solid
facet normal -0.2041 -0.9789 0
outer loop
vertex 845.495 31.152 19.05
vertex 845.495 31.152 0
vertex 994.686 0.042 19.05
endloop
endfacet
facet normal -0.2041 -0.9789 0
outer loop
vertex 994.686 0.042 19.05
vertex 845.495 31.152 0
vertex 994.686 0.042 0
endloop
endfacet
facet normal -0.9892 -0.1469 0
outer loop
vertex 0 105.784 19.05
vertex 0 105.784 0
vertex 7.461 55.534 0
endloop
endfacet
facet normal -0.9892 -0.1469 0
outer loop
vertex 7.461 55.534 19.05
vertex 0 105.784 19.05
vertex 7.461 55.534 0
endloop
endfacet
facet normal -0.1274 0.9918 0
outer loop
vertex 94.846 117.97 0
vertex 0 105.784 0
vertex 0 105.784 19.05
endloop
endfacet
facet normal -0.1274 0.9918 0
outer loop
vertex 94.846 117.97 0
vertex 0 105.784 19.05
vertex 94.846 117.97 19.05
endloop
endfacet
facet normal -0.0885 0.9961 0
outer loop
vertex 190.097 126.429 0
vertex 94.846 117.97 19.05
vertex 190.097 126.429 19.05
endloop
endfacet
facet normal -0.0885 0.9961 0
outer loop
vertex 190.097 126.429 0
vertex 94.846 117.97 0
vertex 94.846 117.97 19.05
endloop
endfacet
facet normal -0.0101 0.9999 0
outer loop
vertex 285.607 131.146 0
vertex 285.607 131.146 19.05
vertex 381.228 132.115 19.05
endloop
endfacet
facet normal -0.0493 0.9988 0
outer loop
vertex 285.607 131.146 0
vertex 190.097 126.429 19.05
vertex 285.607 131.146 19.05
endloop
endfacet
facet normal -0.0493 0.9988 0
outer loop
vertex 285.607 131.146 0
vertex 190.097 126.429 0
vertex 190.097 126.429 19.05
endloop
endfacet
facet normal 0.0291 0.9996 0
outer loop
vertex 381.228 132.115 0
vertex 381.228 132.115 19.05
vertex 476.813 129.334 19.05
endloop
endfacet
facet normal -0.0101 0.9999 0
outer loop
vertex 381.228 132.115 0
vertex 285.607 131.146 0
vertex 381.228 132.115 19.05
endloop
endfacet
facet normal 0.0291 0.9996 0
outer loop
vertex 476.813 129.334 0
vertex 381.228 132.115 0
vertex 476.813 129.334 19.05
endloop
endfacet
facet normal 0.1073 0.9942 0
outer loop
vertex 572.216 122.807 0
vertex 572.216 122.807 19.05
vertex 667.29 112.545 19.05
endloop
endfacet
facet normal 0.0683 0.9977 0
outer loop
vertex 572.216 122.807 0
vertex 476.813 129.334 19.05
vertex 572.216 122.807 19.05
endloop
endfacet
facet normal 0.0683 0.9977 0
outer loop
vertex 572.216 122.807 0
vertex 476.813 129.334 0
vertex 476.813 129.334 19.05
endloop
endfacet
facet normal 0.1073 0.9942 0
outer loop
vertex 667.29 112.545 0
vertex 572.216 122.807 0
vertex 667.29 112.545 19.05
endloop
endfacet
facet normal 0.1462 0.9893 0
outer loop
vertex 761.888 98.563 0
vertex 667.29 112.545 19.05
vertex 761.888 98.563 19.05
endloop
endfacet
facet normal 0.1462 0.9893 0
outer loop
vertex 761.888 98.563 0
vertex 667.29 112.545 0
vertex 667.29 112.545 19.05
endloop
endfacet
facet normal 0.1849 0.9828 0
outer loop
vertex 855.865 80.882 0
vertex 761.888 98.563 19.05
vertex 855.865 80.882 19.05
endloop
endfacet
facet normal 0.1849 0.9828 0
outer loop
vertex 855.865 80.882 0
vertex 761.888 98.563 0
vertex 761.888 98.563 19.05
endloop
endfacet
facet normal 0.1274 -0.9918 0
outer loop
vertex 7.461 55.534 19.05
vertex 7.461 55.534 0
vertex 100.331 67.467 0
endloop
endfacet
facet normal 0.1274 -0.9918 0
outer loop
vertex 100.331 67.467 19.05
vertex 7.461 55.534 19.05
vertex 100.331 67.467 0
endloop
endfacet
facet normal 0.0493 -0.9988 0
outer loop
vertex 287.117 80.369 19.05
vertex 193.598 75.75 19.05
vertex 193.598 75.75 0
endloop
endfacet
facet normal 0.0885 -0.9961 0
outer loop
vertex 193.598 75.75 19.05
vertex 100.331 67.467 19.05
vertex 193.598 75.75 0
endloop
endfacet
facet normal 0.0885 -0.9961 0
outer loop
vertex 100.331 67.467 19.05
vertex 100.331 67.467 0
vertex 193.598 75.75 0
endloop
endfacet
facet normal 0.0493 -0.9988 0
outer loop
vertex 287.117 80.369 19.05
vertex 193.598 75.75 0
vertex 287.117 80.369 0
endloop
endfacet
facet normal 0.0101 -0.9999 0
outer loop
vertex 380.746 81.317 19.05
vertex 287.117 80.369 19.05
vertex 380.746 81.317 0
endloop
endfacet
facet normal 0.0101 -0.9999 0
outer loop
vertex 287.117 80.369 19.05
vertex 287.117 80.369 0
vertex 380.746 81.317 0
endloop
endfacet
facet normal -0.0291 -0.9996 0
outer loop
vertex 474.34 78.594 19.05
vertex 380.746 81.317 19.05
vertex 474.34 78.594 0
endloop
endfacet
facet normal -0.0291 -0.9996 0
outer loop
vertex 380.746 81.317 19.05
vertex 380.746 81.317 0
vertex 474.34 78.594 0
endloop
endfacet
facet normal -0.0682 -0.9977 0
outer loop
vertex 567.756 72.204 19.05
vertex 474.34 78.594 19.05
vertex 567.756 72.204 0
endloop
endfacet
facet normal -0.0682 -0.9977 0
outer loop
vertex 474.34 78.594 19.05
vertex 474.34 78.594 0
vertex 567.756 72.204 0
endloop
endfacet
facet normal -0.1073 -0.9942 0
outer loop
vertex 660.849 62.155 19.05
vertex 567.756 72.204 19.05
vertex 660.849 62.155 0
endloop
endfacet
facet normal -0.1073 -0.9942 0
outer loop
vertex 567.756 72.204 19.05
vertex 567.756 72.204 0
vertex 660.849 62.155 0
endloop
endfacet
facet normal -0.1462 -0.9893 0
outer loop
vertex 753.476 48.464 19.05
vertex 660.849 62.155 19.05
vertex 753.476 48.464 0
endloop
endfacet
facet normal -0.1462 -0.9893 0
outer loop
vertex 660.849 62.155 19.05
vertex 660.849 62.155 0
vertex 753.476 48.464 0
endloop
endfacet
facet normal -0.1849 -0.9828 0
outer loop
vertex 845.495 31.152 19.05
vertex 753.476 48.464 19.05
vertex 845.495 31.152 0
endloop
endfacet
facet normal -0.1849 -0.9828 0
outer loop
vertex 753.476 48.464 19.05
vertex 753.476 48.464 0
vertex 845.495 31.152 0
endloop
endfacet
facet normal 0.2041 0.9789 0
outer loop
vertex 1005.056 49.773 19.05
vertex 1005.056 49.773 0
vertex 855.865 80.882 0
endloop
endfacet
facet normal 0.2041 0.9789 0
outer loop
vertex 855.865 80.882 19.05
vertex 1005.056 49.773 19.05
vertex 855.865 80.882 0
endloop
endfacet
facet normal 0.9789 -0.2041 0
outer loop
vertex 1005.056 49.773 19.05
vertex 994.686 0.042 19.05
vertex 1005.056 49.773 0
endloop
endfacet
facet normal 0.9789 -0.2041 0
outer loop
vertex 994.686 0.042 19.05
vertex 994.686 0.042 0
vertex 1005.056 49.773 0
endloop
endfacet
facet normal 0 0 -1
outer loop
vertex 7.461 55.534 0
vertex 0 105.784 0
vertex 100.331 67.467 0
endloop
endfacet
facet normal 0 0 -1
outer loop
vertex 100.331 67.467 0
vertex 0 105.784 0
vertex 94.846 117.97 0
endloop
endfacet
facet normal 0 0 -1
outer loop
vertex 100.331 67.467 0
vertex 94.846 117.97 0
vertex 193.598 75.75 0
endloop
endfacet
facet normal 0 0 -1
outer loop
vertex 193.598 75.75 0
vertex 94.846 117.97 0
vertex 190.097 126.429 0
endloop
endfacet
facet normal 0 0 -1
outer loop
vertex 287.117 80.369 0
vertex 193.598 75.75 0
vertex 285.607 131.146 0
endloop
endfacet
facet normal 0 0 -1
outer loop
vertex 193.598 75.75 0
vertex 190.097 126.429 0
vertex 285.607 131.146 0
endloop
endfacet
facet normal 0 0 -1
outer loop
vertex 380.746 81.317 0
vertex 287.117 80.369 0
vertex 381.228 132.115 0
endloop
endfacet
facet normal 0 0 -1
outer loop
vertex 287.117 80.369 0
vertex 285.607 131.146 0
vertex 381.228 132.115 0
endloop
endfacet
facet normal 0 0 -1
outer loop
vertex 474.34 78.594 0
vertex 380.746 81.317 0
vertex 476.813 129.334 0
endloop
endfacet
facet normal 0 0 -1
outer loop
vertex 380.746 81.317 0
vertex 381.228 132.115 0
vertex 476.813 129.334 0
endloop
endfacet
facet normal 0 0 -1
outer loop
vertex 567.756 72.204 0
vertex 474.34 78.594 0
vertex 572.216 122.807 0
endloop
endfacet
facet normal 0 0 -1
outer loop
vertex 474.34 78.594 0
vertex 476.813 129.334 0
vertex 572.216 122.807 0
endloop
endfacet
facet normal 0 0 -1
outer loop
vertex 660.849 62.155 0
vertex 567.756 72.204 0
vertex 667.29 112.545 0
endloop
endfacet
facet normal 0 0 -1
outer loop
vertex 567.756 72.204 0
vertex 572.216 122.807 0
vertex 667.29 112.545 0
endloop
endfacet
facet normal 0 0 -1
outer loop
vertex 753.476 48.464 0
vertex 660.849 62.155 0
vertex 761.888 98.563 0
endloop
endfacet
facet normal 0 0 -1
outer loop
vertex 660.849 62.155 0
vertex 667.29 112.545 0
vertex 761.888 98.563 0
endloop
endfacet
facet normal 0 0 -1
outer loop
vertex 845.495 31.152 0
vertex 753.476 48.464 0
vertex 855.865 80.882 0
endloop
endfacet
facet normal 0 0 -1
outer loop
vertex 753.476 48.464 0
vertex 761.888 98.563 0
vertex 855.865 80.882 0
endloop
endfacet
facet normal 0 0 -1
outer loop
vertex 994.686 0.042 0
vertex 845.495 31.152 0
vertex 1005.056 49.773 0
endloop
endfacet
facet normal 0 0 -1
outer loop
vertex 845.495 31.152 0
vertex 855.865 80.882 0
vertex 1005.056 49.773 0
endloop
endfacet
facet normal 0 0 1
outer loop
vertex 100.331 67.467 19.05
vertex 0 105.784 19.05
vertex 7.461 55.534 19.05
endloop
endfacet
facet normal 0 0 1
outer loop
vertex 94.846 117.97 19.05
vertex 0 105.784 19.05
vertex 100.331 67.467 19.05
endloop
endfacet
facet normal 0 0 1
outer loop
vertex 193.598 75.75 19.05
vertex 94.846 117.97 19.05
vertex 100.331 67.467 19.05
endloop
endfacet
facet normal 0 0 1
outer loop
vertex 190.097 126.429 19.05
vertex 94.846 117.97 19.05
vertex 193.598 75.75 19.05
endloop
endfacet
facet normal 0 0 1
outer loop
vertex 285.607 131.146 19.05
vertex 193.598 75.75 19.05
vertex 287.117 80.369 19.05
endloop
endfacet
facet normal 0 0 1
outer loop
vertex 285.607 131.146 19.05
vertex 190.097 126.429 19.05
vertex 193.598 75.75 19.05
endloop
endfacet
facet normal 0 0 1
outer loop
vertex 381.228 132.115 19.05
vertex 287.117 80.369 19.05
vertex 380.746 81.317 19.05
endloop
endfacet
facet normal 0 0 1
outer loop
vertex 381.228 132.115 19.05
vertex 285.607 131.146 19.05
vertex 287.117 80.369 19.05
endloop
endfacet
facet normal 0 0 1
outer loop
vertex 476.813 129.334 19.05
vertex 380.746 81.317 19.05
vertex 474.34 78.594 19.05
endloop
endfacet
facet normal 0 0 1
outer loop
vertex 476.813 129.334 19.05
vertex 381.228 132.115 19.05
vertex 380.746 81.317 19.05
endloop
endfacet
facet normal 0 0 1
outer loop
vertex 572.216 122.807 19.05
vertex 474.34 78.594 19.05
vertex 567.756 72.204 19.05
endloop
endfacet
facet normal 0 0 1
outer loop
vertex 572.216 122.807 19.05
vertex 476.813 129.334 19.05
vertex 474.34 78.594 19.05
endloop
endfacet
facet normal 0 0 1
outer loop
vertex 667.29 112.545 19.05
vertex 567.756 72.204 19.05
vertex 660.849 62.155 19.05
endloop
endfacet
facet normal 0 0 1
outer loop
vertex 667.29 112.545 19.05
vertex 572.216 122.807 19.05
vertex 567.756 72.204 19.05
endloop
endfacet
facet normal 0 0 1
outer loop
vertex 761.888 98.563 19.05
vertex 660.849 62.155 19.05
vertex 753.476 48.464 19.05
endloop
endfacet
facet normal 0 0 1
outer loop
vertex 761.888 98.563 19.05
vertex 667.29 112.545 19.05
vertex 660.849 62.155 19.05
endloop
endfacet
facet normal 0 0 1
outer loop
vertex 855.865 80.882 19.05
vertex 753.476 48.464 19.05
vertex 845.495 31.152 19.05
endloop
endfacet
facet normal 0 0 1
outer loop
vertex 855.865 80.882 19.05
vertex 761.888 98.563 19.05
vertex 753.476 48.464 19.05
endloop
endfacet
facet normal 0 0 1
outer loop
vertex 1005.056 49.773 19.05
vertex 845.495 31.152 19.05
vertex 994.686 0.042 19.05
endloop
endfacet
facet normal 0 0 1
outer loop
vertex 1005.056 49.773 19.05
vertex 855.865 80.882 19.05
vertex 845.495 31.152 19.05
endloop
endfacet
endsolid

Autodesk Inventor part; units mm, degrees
ref_plane "YZ Plane" through (0, 0, 0) normal (1, 0, 0) x (0, 1, 0)
ref_plane "XZ Plane" through (0, 0, 0) normal (0, 1, 0) x (-1, 0, 0)
ref_plane "XY Plane" through (0, 0, 0) normal (0, 0, 1) x (1, 0, 0)
sketch "Sketch1" plane through (0, 0, 0) normal (0, 0, 1) x (1, 0, 0)
  line L0 (0.0002, 105.7836) -> (7.461, 55.5344)
  arc A0 (845.4951, 31.1517) -> (7.461, 55.5344) centre (358.1185, -2306.1754) ccw
  line L1 (845.4951, 31.1517) -> (994.6862, 0.0425)
  line L2 (994.6862, 0.0425) -> (1005.0559, 49.7729)
  line L3 (1005.0559, 49.7729) -> (855.8648, 80.8821)
  arc A1 (855.8648, 80.8821) -> (0.0002, 105.7836) centre (358.1185, -2306.1754) ccw
extrude "Extrusion1" add sketch "Sketch1" along normal blind 19.05
properties part number "nd-i"
